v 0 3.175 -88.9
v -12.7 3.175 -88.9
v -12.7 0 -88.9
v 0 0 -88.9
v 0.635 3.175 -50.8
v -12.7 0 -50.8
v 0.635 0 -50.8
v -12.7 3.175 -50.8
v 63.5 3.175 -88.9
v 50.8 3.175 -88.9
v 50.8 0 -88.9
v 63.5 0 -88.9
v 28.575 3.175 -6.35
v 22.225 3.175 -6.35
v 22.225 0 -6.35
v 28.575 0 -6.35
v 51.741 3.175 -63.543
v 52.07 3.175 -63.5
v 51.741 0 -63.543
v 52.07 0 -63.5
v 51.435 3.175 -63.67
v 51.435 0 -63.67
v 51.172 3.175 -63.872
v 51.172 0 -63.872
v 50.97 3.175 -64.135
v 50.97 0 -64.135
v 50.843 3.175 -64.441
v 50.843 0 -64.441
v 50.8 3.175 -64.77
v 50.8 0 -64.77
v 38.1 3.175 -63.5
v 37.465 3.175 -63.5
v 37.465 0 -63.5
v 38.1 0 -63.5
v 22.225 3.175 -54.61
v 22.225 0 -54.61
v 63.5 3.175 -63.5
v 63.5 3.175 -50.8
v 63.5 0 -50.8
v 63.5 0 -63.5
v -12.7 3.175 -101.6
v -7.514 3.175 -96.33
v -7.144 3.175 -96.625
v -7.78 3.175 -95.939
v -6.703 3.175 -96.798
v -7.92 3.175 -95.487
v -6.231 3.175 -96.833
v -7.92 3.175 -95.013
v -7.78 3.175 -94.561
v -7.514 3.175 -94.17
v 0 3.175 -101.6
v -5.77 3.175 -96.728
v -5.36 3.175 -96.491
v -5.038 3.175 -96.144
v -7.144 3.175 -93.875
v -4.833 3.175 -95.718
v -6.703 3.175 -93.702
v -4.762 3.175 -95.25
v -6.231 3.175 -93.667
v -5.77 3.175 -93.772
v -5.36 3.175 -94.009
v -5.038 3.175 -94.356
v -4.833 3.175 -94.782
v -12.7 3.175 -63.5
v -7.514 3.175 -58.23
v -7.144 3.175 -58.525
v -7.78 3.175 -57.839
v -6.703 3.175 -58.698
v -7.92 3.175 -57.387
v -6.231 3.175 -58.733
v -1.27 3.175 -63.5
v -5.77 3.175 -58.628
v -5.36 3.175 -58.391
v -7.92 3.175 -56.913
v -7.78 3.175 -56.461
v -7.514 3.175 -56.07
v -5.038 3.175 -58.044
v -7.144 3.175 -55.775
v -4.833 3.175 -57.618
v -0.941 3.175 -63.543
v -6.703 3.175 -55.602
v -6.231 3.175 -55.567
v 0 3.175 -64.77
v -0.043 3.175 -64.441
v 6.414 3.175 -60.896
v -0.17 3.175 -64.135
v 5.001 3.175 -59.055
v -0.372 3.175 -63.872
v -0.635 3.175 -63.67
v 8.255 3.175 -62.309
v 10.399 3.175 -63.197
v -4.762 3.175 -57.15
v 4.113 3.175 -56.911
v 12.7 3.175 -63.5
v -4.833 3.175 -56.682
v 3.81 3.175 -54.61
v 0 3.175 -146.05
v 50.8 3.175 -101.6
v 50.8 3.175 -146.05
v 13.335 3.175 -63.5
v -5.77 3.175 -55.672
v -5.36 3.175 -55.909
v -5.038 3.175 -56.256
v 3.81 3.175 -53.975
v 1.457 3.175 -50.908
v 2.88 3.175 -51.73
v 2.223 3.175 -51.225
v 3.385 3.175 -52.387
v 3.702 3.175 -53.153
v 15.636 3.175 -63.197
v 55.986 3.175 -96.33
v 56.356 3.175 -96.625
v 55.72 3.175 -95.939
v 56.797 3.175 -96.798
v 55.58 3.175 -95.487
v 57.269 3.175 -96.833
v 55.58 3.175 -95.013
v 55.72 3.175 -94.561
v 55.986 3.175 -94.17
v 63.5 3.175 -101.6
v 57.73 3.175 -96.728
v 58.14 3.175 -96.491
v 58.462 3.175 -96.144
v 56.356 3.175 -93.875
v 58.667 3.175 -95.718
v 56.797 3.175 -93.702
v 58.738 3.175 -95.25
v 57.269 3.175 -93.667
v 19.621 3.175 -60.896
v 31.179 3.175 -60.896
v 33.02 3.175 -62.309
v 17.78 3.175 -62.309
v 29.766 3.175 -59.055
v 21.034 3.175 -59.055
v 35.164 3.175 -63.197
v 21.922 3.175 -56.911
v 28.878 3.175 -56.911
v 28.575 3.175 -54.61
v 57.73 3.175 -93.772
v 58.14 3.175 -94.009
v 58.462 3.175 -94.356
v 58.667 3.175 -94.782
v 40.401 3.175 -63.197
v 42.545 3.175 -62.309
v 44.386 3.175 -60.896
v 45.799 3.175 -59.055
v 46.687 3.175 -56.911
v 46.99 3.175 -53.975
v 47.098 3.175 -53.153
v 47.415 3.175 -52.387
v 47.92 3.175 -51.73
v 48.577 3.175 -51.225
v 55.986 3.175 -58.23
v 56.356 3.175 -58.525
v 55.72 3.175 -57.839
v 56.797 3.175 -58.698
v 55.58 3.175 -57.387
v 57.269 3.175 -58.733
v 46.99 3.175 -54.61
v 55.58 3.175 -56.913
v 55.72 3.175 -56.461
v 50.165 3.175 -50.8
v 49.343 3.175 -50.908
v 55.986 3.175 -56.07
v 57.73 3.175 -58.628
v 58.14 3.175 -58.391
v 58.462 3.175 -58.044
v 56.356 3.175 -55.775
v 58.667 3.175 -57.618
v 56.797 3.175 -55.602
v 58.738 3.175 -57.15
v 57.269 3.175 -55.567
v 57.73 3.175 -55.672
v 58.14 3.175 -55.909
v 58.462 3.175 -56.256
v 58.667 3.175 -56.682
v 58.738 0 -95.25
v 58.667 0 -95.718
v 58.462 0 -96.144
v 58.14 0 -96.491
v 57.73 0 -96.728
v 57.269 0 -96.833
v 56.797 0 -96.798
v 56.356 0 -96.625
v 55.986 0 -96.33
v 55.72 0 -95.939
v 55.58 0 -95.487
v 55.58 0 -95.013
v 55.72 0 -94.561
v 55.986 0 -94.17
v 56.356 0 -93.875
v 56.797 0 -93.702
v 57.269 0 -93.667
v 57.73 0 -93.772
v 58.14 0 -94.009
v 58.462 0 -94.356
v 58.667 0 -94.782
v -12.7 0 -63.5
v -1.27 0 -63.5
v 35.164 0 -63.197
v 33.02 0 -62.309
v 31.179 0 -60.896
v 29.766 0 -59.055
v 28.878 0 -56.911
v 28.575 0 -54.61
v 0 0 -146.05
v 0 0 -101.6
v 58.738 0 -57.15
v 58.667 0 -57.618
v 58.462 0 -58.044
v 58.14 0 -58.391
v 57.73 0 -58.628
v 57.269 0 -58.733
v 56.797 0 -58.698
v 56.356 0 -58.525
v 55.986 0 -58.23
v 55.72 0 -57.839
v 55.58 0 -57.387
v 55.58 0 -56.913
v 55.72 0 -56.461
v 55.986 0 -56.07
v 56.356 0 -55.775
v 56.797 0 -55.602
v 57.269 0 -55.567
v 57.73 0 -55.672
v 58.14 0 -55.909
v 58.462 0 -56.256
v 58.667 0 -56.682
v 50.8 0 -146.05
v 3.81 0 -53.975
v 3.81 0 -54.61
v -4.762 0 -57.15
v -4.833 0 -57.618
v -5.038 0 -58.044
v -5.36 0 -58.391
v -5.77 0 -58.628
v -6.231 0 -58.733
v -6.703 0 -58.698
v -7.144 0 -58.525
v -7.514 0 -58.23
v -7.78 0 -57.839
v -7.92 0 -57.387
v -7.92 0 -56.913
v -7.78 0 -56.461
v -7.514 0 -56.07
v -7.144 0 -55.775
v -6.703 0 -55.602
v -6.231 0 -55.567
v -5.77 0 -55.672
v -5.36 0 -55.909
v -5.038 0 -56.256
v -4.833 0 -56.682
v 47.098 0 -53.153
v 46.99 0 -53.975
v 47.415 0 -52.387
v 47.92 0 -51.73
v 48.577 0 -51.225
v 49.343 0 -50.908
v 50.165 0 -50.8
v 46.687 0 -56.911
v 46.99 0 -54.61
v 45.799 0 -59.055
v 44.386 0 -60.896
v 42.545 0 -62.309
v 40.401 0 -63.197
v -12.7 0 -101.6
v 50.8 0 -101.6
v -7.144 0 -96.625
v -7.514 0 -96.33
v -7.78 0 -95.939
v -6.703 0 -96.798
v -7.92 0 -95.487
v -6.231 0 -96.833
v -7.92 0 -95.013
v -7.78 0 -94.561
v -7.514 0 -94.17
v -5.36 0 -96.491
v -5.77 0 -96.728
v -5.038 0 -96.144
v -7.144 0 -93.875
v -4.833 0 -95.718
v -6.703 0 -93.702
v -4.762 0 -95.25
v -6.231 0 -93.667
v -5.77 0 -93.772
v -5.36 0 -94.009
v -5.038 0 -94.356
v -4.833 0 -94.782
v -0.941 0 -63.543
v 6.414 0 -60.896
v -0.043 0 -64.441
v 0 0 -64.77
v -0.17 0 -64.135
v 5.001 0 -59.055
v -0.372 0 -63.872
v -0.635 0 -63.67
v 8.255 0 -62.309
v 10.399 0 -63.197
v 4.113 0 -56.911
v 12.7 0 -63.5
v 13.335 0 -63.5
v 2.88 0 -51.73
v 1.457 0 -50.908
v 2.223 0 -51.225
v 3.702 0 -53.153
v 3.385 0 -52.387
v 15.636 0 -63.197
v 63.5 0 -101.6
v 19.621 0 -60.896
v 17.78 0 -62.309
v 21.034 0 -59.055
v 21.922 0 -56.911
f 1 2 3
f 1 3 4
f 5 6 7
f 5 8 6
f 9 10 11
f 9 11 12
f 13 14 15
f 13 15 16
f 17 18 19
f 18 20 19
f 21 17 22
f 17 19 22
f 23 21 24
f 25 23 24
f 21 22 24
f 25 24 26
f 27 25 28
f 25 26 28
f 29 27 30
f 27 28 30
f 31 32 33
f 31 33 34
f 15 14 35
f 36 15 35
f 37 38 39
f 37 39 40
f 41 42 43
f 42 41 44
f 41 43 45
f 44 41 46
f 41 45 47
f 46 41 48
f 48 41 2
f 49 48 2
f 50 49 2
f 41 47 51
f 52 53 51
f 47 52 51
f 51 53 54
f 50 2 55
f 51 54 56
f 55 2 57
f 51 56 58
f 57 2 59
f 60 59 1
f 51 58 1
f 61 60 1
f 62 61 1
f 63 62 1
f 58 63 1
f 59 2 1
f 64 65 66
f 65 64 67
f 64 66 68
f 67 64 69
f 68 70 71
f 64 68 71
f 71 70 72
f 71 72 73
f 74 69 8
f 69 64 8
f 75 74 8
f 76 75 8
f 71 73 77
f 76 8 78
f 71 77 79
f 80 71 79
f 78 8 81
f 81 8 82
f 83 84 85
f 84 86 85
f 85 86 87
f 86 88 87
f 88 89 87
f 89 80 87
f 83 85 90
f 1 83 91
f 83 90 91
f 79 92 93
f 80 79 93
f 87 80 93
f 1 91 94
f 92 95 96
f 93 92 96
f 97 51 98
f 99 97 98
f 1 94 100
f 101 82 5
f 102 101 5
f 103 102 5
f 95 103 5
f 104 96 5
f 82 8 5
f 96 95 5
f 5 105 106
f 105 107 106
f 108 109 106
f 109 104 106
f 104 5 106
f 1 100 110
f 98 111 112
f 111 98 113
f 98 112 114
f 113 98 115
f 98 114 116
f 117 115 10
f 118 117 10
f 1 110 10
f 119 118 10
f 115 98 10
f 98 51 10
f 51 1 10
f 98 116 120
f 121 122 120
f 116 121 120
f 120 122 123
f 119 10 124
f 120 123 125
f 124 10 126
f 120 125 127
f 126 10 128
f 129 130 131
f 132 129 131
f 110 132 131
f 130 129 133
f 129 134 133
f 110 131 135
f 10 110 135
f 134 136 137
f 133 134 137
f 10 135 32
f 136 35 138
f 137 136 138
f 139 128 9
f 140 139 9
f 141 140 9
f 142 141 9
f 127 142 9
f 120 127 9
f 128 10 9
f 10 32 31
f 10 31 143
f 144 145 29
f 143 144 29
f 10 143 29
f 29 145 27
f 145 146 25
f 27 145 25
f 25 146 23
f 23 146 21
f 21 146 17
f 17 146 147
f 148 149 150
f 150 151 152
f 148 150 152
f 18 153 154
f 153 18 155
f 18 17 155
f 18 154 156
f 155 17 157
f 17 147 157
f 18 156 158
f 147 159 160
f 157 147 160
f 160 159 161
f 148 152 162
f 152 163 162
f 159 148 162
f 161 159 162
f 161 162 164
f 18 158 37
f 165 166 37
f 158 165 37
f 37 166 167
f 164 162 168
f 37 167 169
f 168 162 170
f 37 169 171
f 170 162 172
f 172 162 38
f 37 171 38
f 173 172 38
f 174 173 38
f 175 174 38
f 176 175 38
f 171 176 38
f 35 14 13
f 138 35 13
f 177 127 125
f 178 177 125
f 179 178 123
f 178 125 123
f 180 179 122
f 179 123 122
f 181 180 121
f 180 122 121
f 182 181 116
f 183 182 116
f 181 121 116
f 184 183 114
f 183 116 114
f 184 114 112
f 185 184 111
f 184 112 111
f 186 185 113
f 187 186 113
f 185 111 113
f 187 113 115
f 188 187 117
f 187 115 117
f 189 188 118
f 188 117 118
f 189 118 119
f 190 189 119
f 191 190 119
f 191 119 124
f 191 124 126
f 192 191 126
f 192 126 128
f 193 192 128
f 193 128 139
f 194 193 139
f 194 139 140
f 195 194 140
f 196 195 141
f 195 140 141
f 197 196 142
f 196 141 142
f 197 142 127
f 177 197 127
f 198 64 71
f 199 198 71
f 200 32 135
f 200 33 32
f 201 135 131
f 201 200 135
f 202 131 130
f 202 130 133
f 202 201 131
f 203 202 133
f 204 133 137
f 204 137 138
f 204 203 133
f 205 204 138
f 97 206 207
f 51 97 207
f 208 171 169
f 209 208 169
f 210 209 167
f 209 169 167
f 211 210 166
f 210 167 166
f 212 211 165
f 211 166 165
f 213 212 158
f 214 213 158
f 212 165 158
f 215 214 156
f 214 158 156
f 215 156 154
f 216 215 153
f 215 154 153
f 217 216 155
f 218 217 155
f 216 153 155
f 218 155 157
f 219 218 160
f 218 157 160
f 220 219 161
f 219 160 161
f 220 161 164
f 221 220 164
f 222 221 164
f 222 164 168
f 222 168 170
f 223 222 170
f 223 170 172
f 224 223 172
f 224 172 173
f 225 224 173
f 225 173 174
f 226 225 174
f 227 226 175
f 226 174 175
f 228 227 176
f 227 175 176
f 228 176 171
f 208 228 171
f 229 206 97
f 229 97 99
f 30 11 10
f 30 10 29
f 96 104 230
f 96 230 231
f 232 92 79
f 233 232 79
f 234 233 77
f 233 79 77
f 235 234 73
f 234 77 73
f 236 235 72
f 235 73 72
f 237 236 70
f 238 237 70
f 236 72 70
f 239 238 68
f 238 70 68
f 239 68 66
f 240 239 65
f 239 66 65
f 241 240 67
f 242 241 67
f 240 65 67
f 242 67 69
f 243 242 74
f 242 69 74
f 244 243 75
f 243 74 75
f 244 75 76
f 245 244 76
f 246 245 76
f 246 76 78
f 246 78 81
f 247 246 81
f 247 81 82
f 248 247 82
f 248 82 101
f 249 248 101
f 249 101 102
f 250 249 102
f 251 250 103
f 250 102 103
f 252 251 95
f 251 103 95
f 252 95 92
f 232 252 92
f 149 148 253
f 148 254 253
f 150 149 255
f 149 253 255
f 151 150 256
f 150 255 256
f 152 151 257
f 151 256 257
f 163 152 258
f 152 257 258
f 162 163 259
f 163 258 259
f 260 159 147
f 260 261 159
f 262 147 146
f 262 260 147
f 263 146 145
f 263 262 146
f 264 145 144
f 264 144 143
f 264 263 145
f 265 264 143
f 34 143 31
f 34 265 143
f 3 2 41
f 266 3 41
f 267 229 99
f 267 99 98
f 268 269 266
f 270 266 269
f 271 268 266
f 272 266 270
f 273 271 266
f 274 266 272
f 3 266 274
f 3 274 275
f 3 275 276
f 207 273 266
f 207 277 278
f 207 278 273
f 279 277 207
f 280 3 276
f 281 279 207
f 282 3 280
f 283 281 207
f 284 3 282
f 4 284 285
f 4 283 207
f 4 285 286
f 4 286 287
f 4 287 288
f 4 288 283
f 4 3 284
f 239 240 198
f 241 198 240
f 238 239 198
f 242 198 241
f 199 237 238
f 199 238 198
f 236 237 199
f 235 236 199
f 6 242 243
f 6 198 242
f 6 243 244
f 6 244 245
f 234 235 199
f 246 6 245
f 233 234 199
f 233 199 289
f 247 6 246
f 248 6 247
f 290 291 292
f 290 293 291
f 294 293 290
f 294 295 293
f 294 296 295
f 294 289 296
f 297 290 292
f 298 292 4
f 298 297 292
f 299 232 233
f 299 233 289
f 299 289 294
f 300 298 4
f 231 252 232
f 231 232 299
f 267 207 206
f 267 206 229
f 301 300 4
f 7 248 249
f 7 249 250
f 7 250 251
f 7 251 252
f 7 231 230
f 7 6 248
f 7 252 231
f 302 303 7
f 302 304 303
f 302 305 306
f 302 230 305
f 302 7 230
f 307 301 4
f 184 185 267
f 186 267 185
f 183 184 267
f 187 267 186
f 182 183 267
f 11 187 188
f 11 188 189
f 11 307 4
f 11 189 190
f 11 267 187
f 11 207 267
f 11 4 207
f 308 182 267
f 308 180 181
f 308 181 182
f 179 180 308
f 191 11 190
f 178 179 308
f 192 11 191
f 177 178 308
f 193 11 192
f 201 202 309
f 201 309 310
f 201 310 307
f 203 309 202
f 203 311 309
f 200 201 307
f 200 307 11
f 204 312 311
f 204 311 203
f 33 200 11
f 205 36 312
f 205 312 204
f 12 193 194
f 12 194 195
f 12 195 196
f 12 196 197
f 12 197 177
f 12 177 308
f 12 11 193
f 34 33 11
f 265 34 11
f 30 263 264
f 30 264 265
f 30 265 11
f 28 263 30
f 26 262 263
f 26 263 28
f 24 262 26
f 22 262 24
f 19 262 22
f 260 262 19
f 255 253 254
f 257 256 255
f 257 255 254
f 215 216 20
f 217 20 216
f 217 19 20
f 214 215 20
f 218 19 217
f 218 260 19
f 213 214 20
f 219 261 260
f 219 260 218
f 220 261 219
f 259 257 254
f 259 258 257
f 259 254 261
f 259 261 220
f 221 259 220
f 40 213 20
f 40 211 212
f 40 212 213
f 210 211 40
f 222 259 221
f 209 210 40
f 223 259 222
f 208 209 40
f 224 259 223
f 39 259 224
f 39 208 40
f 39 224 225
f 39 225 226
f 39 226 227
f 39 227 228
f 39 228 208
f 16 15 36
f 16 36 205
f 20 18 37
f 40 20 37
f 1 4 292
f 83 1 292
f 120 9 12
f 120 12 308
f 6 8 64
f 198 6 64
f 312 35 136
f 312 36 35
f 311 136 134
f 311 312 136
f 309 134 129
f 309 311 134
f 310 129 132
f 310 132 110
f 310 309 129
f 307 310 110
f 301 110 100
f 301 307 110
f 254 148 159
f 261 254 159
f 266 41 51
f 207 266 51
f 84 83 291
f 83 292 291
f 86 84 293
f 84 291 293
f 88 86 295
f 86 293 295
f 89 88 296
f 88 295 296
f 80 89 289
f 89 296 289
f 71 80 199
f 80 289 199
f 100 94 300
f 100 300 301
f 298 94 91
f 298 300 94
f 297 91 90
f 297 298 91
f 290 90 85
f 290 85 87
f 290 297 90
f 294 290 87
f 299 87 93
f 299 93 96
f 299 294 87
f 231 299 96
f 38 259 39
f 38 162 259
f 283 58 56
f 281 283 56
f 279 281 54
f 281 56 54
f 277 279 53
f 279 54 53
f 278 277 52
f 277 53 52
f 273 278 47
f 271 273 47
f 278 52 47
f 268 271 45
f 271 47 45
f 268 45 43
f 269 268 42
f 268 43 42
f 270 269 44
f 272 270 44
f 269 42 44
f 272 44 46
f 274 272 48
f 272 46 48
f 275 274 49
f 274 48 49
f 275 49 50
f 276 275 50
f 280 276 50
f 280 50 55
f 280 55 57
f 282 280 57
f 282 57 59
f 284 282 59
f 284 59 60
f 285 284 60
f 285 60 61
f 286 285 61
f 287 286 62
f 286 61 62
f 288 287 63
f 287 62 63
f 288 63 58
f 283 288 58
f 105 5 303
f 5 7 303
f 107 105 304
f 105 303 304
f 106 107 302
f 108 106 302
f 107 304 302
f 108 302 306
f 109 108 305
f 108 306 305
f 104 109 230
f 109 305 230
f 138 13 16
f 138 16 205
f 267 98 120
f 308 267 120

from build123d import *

# Parameters (mm, degrees)
SKETCH1_W           = 50.8
SKETCH1_H           = 76.2
BOSS_EXTRUDE1_DEPTH = 3.175
SKETCH2_W           = 18.415
SKETCH2_H           = 63.5
CUT_EXTRUDE1_DEPTH  = 3.175
SKETCH3_W           = 12.7
SKETCH3_H           = 12.7
SKETCH3_R           = 1.5875
BOSS_EXTRUDE2_DEPTH = 3.175
SKETCH7_W           = 50.8
SKETCH7_H           = 12.7
BOSS_EXTRUDE3_DEPTH = 3.175
SKETCH8_W           = 50.8
SKETCH8_H           = 57.15
BOSS_EXTRUDE4_DEPTH = 3.175
LPATTERN1_COUNT     = 2
LPATTERN1_PITCH     = 38.1
FILLET1_R           = 8.89
SKETCH9_W           = 6.35
SKETCH9_H           = 6.35
CUT_EXTRUDE2_DEPTH  = 3.175
SKETCH10_W          = 3.81
SKETCH10_H          = 50.8
CUT_EXTRUDE3_DEPTH  = 3.175
FILLET2_R           = 3.175
FILLET3_R           = 1.27


with BuildPart() as part:
    # Sketch1 → Boss-Extrude1 (new body)
    with BuildSketch(Plane(origin=(0, 0, 0), x_dir=(1, 0, 0), z_dir=(0, 1, 0))):
        with Locations((25.4, 38.1)):
            Rectangle(SKETCH1_W, SKETCH1_H)
    extrude(amount=BOSS_EXTRUDE1_DEPTH)

    # Sketch2 → Cut-Extrude1 (cut)
    with BuildSketch(Plane(origin=(0, 3.175, 0), x_dir=(1, 0, 0), z_dir=(0, 1, 0))):
        with Locations((13.0175, 31.75)):
            Rectangle(SKETCH2_W, SKETCH2_H)
        with Locations((37.7825, 31.75)):
            Rectangle(SKETCH2_W, SKETCH2_H)
    extrude(amount=-CUT_EXTRUDE1_DEPTH, mode=Mode.SUBTRACT)

    # Sketch3 → Boss-Extrude2 (add)
    with BuildSketch(Plane(origin=(0, 3.175, 0), x_dir=(1, 0, 0), z_dir=(0, 1, 0))):
        with Locations((-6.35, 57.15)):
            Rectangle(SKETCH3_W, SKETCH3_H)
        with Locations((-6.35, 57.15)):
            Circle(SKETCH3_R, mode=Mode.SUBTRACT)
        with Locations((57.15, 57.15)):
            Rectangle(SKETCH3_W, SKETCH3_H)
        with Locations((57.15, 57.15)):
            Circle(SKETCH3_R, mode=Mode.SUBTRACT)
    boss_extrude2 = extrude(amount=-BOSS_EXTRUDE2_DEPTH)

    # Sketch7 → Boss-Extrude3 (add)
    with BuildSketch(Plane(origin=(0, 3.175, 0), x_dir=(1, 0, 0), z_dir=(0, 1, 0))):
        with Locations((25.4, 82.55)):
            Rectangle(SKETCH7_W, SKETCH7_H)
    extrude(amount=-BOSS_EXTRUDE3_DEPTH)

    # Sketch8 → Boss-Extrude4 (add)
    with BuildSketch(Plane.XZ):
        with Locations((25.4, -117.475)):
            Rectangle(SKETCH8_W, SKETCH8_H)
    extrude(amount=-BOSS_EXTRUDE4_DEPTH)

    # LPattern1: Boss-Extrude2 ×2
    with Locations(*[(0, 0, -i * LPATTERN1_PITCH) for i in range(1, LPATTERN1_COUNT)]):
        add(boss_extrude2)

    # Fillet1
    fillet1_edges = [part.edges().sort_by_distance(p)[0] for p in [
        (3.81, 1.5875, -63.5),
        (22.225, 1.5875, -63.5),
        (28.575, 1.5875, -63.5),
        (46.99, 1.5875, -63.5),
    ]]
    fillet(fillet1_edges, radius=FILLET1_R)

    # Sketch9 → Cut-Extrude2 (cut)
    with BuildSketch(Plane(origin=(0, 3.175, 0), x_dir=(1, 0, 0), z_dir=(0, 1, 0))):
        with Locations((25.4, 3.175)):
            Rectangle(SKETCH9_W, SKETCH9_H)
    extrude(amount=-CUT_EXTRUDE2_DEPTH, mode=Mode.SUBTRACT)

    # Sketch10 → Cut-Extrude3 (cut)
    with BuildSketch(Plane(origin=(0, 3.175, 0), x_dir=(1, 0, 0), z_dir=(0, 1, 0))):
        with Locations((1.905, 25.4)):
            Rectangle(SKETCH10_W, SKETCH10_H)
        with Locations((48.895, 25.4)):
            Rectangle(SKETCH10_W, SKETCH10_H)
    extrude(amount=-CUT_EXTRUDE3_DEPTH, mode=Mode.SUBTRACT)

    # Fillet2
    fillet2_edges = [part.edges().sort_by_distance(p)[0] for p in [
        (3.81, 1.5875, -50.8),
        (46.99, 1.5875, -50.8),
    ]]
    fillet(fillet2_edges, radius=FILLET2_R)

    # Fillet3
    fillet3_edges = [part.edges().sort_by_distance(p)[0] for p in [
        (0, 1.5875, -63.5),
        (50.8, 1.5875, -63.5),
    ]]
    fillet(fillet3_edges, radius=FILLET3_R)


solid = part.part
